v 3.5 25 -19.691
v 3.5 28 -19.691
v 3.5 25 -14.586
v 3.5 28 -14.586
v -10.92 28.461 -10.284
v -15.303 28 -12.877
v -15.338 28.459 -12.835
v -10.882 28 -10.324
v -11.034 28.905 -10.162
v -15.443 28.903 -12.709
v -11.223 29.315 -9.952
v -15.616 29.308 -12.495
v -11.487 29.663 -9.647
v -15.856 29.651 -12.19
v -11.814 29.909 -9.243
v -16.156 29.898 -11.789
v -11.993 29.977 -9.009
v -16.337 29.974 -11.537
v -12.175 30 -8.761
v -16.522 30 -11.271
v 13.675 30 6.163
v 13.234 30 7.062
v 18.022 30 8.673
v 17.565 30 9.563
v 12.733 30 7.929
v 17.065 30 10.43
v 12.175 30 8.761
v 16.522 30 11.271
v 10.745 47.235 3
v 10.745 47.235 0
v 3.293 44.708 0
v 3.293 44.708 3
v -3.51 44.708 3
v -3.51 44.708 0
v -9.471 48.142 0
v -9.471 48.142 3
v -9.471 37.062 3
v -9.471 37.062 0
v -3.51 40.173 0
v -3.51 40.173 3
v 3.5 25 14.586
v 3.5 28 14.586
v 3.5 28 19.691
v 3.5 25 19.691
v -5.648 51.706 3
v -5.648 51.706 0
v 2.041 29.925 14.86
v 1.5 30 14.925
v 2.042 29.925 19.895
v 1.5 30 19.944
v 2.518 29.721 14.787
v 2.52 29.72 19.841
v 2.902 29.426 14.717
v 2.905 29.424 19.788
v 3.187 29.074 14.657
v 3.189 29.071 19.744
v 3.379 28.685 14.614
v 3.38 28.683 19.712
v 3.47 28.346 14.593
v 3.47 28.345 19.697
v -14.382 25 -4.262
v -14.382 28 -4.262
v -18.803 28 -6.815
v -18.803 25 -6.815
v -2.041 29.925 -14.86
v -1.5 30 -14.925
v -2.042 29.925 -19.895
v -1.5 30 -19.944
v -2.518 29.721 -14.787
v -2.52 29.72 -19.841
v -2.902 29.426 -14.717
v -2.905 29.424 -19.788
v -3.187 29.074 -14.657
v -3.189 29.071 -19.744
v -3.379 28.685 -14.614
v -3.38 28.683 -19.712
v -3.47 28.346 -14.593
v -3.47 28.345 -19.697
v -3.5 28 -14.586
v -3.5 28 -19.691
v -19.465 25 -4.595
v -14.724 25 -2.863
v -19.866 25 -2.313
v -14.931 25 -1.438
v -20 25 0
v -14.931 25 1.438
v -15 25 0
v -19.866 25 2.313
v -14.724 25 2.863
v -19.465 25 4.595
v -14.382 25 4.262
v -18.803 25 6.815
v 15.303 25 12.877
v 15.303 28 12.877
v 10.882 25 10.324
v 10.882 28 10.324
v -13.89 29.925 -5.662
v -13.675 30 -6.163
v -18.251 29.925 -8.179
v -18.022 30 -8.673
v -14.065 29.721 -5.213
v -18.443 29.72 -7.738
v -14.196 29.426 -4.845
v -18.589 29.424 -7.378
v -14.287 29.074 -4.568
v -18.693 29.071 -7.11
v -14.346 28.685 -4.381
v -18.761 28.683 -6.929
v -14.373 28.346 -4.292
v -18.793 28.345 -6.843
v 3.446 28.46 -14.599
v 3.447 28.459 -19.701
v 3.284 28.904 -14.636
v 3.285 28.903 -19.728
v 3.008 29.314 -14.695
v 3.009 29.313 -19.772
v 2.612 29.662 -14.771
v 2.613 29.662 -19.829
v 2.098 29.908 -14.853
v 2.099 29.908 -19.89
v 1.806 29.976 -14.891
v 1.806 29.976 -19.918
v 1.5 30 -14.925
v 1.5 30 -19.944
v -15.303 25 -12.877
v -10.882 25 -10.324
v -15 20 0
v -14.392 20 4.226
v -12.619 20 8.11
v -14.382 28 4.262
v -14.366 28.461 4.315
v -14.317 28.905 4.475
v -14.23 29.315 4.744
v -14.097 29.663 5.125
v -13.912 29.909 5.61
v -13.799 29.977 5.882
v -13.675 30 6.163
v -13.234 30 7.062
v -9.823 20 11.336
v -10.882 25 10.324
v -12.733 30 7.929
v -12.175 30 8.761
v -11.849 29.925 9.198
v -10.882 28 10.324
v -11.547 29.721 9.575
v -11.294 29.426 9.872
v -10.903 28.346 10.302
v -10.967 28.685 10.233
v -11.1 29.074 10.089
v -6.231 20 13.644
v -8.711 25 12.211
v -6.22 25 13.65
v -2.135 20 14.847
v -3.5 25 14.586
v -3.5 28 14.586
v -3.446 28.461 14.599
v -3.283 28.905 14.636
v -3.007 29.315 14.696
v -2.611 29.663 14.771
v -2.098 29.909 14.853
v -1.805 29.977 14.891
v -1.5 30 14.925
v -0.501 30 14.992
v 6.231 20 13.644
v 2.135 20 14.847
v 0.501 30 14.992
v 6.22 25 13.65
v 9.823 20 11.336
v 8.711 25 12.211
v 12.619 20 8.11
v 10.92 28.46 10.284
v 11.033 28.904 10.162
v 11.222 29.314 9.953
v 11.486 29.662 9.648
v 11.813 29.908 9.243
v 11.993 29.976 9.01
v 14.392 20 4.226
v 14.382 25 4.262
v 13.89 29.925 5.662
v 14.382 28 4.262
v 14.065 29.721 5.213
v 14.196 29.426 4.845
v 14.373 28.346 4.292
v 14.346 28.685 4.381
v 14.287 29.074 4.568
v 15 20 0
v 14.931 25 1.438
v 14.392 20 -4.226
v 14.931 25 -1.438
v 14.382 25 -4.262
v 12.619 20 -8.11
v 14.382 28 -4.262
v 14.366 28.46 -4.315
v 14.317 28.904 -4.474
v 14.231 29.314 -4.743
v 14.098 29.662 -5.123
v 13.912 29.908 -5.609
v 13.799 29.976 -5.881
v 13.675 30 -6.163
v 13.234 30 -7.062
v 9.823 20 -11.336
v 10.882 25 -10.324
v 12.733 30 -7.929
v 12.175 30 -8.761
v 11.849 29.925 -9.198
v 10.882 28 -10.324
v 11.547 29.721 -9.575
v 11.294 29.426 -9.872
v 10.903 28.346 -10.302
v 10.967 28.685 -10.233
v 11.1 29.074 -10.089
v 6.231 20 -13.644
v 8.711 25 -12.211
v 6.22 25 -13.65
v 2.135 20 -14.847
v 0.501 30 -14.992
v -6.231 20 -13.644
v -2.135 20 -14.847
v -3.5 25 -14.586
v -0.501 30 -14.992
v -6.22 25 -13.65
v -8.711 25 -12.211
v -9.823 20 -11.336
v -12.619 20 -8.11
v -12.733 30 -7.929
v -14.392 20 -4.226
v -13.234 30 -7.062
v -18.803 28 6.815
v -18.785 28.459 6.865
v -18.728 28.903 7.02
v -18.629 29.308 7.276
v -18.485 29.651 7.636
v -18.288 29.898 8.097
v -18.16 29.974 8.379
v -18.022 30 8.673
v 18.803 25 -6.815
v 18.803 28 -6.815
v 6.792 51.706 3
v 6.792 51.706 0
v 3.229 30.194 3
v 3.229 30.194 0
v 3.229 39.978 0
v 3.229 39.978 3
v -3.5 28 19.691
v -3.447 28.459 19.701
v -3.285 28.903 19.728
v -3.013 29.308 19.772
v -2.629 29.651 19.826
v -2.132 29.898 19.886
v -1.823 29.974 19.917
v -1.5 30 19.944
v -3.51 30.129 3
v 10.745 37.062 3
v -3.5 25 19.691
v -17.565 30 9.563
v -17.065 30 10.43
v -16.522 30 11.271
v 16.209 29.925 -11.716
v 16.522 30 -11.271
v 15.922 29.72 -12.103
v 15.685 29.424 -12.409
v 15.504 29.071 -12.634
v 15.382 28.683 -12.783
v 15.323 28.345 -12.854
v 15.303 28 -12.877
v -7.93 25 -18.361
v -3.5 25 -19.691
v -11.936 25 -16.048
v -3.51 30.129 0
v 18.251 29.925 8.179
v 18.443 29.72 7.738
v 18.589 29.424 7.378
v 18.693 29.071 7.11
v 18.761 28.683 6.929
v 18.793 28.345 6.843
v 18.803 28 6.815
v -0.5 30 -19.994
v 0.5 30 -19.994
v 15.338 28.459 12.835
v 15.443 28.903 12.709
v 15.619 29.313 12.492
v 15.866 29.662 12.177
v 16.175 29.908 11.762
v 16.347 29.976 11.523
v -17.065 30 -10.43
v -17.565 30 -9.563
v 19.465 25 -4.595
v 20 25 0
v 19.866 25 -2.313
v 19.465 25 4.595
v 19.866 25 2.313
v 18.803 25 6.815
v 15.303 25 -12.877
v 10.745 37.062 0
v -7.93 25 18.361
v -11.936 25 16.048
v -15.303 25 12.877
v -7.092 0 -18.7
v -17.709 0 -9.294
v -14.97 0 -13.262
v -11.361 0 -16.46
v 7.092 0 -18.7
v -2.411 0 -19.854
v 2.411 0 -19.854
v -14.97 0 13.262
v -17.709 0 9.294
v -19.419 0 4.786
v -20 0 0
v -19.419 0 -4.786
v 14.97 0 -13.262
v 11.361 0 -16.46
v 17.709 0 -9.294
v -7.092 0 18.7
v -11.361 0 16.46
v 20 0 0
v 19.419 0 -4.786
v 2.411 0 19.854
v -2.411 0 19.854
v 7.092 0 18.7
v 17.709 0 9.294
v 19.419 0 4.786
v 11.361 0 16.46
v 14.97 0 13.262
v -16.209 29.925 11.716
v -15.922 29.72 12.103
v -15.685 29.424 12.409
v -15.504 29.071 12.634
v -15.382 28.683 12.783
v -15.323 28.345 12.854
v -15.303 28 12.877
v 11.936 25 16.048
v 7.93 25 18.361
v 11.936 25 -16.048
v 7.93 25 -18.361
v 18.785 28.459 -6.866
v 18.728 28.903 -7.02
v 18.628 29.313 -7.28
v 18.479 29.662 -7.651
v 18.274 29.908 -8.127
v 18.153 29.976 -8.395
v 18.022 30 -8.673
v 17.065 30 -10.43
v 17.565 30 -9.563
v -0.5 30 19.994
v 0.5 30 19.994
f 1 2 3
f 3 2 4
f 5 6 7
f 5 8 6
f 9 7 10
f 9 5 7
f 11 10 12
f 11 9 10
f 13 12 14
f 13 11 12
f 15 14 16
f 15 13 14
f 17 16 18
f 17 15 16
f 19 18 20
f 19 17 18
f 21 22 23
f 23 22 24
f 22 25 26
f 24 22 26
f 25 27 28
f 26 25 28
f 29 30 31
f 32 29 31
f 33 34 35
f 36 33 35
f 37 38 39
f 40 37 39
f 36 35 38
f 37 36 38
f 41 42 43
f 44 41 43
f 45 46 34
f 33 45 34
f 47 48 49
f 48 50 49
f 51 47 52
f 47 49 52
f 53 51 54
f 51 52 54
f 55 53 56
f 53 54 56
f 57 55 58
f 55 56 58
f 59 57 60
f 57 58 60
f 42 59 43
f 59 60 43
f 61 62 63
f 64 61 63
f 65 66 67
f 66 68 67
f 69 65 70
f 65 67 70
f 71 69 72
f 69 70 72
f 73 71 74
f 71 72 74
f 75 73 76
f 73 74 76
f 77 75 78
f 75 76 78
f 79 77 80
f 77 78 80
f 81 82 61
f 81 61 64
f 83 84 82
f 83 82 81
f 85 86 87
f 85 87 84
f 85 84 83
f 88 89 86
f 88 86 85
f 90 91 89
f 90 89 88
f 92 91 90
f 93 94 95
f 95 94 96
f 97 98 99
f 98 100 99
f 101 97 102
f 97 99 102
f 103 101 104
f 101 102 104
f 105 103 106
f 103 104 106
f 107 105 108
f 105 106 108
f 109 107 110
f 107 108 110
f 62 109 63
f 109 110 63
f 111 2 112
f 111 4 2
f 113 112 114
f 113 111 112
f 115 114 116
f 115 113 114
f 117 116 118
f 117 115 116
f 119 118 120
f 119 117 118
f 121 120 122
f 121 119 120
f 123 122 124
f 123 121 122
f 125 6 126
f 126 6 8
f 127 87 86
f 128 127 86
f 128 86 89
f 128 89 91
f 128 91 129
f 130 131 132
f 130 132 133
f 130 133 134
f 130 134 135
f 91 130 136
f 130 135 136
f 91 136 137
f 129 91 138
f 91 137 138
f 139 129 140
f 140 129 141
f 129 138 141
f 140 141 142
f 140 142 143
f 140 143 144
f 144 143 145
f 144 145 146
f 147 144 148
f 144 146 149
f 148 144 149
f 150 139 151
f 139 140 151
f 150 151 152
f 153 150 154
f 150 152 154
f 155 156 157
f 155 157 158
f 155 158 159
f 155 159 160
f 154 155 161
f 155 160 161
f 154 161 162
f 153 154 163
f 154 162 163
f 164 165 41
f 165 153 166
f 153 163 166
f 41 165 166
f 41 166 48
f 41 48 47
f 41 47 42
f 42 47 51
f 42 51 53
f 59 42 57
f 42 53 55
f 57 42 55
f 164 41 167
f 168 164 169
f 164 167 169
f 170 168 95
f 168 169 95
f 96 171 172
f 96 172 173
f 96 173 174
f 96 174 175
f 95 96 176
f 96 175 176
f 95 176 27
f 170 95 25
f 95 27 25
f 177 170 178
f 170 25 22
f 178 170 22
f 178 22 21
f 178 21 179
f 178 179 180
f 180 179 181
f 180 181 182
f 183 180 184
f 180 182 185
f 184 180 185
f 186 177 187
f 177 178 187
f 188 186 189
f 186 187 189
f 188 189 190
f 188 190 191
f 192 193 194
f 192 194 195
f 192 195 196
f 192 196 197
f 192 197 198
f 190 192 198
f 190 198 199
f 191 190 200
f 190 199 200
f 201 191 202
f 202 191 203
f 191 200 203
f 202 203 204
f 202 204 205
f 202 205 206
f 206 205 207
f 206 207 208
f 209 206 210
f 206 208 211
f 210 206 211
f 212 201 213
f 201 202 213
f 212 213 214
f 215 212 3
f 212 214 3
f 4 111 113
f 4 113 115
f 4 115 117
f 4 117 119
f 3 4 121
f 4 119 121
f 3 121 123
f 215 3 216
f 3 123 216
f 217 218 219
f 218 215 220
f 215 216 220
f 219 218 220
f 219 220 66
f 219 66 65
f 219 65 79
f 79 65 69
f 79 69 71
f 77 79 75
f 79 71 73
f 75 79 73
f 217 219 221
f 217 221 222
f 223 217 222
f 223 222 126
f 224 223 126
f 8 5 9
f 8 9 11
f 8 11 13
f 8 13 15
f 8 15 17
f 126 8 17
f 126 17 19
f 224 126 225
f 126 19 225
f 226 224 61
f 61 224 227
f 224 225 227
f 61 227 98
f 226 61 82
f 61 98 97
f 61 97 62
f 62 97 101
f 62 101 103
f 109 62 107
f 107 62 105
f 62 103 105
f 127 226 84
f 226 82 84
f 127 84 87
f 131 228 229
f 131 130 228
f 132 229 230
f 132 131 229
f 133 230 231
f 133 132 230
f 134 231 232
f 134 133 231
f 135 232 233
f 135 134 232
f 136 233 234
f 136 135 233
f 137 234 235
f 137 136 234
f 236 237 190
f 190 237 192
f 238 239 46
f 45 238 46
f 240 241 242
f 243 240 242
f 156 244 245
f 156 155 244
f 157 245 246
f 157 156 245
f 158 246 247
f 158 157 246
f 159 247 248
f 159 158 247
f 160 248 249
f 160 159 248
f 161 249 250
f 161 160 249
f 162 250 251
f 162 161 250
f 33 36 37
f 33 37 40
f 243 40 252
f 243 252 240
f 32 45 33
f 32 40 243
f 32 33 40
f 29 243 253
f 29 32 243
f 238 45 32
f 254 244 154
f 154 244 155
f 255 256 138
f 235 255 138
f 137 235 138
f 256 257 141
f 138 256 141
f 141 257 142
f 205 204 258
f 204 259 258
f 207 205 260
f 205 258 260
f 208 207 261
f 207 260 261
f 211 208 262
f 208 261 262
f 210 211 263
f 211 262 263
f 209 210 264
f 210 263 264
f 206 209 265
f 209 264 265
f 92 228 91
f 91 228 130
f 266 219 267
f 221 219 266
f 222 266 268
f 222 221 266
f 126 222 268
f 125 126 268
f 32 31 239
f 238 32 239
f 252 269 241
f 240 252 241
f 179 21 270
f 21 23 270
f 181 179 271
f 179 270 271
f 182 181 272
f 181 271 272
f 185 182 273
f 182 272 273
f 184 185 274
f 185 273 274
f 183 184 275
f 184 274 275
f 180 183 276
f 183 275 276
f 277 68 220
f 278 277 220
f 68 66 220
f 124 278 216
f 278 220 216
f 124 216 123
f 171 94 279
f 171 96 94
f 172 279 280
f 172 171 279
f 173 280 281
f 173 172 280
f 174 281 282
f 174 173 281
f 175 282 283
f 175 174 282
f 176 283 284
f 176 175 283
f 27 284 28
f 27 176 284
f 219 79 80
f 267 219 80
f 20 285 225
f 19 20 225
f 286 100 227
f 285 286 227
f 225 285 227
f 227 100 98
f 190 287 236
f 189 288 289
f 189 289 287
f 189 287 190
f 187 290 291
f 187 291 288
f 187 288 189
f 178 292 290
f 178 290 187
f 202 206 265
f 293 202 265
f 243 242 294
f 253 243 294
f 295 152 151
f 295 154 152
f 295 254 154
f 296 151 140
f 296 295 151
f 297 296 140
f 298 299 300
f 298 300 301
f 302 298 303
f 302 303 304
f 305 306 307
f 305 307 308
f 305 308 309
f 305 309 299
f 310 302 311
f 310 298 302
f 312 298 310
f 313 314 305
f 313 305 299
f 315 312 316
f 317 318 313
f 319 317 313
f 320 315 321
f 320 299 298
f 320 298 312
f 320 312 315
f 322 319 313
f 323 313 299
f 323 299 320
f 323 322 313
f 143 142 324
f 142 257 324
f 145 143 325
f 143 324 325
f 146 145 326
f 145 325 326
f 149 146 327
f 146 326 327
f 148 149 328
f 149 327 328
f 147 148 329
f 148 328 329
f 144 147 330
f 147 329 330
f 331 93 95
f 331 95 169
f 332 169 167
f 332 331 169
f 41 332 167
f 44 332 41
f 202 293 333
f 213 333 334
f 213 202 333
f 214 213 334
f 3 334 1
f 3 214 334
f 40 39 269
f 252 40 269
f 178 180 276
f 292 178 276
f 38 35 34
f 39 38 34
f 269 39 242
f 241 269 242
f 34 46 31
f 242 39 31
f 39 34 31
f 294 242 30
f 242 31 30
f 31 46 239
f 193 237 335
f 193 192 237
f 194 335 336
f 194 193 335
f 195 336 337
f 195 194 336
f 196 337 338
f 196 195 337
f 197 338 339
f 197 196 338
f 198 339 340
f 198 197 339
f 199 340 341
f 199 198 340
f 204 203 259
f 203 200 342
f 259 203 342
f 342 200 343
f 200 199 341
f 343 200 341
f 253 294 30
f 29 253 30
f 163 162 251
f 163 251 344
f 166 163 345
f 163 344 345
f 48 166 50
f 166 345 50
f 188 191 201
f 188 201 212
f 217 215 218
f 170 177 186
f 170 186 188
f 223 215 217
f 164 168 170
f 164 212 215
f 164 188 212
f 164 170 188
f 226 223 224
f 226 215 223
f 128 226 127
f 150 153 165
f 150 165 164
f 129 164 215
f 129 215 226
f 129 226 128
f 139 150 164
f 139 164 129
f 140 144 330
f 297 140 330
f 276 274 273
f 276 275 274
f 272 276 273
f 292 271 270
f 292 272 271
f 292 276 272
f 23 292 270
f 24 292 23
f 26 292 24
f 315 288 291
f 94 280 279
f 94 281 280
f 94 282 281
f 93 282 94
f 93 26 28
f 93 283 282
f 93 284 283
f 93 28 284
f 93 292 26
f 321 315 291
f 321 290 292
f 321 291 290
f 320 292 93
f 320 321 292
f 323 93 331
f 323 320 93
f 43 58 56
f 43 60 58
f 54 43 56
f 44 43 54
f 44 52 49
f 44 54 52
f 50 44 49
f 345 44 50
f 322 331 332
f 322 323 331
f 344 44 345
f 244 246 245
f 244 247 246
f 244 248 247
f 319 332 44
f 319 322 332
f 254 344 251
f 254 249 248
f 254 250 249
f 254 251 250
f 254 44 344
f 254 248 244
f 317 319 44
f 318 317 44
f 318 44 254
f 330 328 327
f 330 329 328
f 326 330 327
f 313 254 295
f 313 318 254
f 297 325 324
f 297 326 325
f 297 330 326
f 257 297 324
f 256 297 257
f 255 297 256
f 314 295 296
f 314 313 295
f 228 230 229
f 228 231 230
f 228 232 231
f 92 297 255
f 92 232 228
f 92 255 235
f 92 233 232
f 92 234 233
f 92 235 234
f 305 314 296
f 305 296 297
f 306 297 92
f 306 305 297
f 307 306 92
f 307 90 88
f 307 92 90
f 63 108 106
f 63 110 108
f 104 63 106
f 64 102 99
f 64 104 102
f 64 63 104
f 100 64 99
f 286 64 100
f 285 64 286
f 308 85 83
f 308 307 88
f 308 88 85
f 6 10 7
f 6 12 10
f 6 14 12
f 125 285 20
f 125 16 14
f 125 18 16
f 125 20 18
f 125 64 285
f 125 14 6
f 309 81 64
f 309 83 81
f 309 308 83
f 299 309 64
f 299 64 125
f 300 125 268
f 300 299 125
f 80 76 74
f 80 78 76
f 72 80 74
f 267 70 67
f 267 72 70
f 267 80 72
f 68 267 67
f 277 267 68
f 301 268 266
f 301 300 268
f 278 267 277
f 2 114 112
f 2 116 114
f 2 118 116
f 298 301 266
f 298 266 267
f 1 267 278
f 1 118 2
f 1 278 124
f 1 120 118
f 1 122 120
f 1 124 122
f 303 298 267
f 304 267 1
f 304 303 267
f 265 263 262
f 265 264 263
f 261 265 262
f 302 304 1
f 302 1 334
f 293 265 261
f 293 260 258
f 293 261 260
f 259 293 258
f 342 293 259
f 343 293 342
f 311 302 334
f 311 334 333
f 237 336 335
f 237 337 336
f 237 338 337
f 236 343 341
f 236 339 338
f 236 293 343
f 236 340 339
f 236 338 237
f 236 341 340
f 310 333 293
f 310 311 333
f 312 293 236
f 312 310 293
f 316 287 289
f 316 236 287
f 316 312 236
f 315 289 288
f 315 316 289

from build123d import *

# Parameters (mm, degrees)
F0_R     = 20
F1_DEPTH = 30
F2_R     = 15
F3_DEPTH = 10
F5_DEPTH = 5
F6_R     = 2
F8_DEPTH = 3


with BuildPart() as f1:
    # F0 (on Front) → F1 (new body)
    with BuildSketch(Plane.XZ):
        Circle(F0_R)
    extrude(amount=-F1_DEPTH)

    # F2 (on face) → F3 (cut)
    with BuildSketch(Plane(origin=(0, 30, 0), x_dir=(-1, 0, 0), z_dir=(0, 1, 0))):
        Circle(F2_R)
    extrude(amount=-F3_DEPTH, mode=Mode.SUBTRACT)

    # F4 (on face) → F5 (cut)
    with BuildSketch(Plane(origin=(0, 30, 0), x_dir=(-1, 0, 0), z_dir=(0, 1, 0))):
        with BuildLine():
            Line((-3.5, -19.691369), (-3.5, -14.585952))
            Line((-3.5, -14.585952), (3.5, -14.585952))
            Line((3.5, -14.585952), (3.5, -19.691369))
            ThreePointArc((3.5, -19.691369), (10, -17.320508), (15.303226, -12.876773))
            Line((15.303226, -12.876773), (10.881805, -10.324065))
            Line((10.881805, -10.324065), (14.381805, -4.261887))
            Line((14.381805, -4.261887), (18.803226, -6.814595))
            ThreePointArc((18.803226, -6.814595), (19.698534, -3.459443), (20, 0))
            ThreePointArc((20, 0), (19.698534, 3.459443), (18.803226, 6.814595))
            Line((18.803226, 6.814595), (14.381805, 4.261887))
            Line((14.381805, 4.261887), (10.881805, 10.324065))
            Line((10.881805, 10.324065), (15.303226, 12.876773))
            ThreePointArc((15.303226, 12.876773), (10, 17.320508), (3.5, 19.691369))
            Line((3.5, 19.691369), (3.5, 14.585952))
            Line((3.5, 14.585952), (-3.5, 14.585952))
            Line((-3.5, 14.585952), (-3.5, 19.691369))
            ThreePointArc((-3.5, 19.691369), (-10, 17.320508), (-15.303226, 12.876773))
            Line((-15.303226, 12.876773), (-10.881805, 10.324065))
            Line((-10.881805, 10.324065), (-14.381805, 4.261887))
            Line((-14.381805, 4.261887), (-18.803226, 6.814595))
            ThreePointArc((-18.803226, 6.814595), (-20, 0), (-18.803226, -6.814595))
            Line((-18.803226, -6.814595), (-14.381805, -4.261887))
            Line((-14.381805, -4.261887), (-10.881805, -10.324065))
            Line((-10.881805, -10.324065), (-15.303226, -12.876773))
            ThreePointArc((-15.303226, -12.876773), (-10, -17.320508), (-3.5, -19.691369))
        make_face()
    extrude(amount=-F5_DEPTH, mode=Mode.SUBTRACT)

    # F6
    f6_edges = [f1.edges().sort_by_distance(p)[0] for p in [
        (-3.5, 30, -17.13866),
        (3.5, 30, -17.13866),
        (13.092515, 30, -11.600419),
        (16.592515, 30, -5.538241),
        (16.592515, 30, 5.538241),
        (3.5, 30, 17.13866),
        (-3.5, 30, 17.13866),
        (-13.092515, 30, 11.600419),
        (-16.592515, 30, 5.538241),
        (-16.592515, 30, -5.538241),
        (-13.092515, 30, -11.600419),
        (13.092515, 30, 11.600419),
    ]]
    fillet(f6_edges, radius=F6_R)


with BuildPart() as f8:
    # F7 (on Top) → F8 (new body)
    with BuildSketch(Plane.XY):
        Polygon((-3.510108, 40.17261), (-3.510108, 30.129371), (3.228583, 30.194167), (3.228583, 39.978229), (10.744815, 37.062448), (10.744815, 47.235277), (3.293378, 44.708267), (6.792313, 51.706139), (-5.648347, 51.706139), (-3.510108, 44.708267), (-9.471257, 48.142411), (-9.471257, 37.062448), align=None)
    extrude(amount=F8_DEPTH)


solid = Compound([f1.part, f8.part])
